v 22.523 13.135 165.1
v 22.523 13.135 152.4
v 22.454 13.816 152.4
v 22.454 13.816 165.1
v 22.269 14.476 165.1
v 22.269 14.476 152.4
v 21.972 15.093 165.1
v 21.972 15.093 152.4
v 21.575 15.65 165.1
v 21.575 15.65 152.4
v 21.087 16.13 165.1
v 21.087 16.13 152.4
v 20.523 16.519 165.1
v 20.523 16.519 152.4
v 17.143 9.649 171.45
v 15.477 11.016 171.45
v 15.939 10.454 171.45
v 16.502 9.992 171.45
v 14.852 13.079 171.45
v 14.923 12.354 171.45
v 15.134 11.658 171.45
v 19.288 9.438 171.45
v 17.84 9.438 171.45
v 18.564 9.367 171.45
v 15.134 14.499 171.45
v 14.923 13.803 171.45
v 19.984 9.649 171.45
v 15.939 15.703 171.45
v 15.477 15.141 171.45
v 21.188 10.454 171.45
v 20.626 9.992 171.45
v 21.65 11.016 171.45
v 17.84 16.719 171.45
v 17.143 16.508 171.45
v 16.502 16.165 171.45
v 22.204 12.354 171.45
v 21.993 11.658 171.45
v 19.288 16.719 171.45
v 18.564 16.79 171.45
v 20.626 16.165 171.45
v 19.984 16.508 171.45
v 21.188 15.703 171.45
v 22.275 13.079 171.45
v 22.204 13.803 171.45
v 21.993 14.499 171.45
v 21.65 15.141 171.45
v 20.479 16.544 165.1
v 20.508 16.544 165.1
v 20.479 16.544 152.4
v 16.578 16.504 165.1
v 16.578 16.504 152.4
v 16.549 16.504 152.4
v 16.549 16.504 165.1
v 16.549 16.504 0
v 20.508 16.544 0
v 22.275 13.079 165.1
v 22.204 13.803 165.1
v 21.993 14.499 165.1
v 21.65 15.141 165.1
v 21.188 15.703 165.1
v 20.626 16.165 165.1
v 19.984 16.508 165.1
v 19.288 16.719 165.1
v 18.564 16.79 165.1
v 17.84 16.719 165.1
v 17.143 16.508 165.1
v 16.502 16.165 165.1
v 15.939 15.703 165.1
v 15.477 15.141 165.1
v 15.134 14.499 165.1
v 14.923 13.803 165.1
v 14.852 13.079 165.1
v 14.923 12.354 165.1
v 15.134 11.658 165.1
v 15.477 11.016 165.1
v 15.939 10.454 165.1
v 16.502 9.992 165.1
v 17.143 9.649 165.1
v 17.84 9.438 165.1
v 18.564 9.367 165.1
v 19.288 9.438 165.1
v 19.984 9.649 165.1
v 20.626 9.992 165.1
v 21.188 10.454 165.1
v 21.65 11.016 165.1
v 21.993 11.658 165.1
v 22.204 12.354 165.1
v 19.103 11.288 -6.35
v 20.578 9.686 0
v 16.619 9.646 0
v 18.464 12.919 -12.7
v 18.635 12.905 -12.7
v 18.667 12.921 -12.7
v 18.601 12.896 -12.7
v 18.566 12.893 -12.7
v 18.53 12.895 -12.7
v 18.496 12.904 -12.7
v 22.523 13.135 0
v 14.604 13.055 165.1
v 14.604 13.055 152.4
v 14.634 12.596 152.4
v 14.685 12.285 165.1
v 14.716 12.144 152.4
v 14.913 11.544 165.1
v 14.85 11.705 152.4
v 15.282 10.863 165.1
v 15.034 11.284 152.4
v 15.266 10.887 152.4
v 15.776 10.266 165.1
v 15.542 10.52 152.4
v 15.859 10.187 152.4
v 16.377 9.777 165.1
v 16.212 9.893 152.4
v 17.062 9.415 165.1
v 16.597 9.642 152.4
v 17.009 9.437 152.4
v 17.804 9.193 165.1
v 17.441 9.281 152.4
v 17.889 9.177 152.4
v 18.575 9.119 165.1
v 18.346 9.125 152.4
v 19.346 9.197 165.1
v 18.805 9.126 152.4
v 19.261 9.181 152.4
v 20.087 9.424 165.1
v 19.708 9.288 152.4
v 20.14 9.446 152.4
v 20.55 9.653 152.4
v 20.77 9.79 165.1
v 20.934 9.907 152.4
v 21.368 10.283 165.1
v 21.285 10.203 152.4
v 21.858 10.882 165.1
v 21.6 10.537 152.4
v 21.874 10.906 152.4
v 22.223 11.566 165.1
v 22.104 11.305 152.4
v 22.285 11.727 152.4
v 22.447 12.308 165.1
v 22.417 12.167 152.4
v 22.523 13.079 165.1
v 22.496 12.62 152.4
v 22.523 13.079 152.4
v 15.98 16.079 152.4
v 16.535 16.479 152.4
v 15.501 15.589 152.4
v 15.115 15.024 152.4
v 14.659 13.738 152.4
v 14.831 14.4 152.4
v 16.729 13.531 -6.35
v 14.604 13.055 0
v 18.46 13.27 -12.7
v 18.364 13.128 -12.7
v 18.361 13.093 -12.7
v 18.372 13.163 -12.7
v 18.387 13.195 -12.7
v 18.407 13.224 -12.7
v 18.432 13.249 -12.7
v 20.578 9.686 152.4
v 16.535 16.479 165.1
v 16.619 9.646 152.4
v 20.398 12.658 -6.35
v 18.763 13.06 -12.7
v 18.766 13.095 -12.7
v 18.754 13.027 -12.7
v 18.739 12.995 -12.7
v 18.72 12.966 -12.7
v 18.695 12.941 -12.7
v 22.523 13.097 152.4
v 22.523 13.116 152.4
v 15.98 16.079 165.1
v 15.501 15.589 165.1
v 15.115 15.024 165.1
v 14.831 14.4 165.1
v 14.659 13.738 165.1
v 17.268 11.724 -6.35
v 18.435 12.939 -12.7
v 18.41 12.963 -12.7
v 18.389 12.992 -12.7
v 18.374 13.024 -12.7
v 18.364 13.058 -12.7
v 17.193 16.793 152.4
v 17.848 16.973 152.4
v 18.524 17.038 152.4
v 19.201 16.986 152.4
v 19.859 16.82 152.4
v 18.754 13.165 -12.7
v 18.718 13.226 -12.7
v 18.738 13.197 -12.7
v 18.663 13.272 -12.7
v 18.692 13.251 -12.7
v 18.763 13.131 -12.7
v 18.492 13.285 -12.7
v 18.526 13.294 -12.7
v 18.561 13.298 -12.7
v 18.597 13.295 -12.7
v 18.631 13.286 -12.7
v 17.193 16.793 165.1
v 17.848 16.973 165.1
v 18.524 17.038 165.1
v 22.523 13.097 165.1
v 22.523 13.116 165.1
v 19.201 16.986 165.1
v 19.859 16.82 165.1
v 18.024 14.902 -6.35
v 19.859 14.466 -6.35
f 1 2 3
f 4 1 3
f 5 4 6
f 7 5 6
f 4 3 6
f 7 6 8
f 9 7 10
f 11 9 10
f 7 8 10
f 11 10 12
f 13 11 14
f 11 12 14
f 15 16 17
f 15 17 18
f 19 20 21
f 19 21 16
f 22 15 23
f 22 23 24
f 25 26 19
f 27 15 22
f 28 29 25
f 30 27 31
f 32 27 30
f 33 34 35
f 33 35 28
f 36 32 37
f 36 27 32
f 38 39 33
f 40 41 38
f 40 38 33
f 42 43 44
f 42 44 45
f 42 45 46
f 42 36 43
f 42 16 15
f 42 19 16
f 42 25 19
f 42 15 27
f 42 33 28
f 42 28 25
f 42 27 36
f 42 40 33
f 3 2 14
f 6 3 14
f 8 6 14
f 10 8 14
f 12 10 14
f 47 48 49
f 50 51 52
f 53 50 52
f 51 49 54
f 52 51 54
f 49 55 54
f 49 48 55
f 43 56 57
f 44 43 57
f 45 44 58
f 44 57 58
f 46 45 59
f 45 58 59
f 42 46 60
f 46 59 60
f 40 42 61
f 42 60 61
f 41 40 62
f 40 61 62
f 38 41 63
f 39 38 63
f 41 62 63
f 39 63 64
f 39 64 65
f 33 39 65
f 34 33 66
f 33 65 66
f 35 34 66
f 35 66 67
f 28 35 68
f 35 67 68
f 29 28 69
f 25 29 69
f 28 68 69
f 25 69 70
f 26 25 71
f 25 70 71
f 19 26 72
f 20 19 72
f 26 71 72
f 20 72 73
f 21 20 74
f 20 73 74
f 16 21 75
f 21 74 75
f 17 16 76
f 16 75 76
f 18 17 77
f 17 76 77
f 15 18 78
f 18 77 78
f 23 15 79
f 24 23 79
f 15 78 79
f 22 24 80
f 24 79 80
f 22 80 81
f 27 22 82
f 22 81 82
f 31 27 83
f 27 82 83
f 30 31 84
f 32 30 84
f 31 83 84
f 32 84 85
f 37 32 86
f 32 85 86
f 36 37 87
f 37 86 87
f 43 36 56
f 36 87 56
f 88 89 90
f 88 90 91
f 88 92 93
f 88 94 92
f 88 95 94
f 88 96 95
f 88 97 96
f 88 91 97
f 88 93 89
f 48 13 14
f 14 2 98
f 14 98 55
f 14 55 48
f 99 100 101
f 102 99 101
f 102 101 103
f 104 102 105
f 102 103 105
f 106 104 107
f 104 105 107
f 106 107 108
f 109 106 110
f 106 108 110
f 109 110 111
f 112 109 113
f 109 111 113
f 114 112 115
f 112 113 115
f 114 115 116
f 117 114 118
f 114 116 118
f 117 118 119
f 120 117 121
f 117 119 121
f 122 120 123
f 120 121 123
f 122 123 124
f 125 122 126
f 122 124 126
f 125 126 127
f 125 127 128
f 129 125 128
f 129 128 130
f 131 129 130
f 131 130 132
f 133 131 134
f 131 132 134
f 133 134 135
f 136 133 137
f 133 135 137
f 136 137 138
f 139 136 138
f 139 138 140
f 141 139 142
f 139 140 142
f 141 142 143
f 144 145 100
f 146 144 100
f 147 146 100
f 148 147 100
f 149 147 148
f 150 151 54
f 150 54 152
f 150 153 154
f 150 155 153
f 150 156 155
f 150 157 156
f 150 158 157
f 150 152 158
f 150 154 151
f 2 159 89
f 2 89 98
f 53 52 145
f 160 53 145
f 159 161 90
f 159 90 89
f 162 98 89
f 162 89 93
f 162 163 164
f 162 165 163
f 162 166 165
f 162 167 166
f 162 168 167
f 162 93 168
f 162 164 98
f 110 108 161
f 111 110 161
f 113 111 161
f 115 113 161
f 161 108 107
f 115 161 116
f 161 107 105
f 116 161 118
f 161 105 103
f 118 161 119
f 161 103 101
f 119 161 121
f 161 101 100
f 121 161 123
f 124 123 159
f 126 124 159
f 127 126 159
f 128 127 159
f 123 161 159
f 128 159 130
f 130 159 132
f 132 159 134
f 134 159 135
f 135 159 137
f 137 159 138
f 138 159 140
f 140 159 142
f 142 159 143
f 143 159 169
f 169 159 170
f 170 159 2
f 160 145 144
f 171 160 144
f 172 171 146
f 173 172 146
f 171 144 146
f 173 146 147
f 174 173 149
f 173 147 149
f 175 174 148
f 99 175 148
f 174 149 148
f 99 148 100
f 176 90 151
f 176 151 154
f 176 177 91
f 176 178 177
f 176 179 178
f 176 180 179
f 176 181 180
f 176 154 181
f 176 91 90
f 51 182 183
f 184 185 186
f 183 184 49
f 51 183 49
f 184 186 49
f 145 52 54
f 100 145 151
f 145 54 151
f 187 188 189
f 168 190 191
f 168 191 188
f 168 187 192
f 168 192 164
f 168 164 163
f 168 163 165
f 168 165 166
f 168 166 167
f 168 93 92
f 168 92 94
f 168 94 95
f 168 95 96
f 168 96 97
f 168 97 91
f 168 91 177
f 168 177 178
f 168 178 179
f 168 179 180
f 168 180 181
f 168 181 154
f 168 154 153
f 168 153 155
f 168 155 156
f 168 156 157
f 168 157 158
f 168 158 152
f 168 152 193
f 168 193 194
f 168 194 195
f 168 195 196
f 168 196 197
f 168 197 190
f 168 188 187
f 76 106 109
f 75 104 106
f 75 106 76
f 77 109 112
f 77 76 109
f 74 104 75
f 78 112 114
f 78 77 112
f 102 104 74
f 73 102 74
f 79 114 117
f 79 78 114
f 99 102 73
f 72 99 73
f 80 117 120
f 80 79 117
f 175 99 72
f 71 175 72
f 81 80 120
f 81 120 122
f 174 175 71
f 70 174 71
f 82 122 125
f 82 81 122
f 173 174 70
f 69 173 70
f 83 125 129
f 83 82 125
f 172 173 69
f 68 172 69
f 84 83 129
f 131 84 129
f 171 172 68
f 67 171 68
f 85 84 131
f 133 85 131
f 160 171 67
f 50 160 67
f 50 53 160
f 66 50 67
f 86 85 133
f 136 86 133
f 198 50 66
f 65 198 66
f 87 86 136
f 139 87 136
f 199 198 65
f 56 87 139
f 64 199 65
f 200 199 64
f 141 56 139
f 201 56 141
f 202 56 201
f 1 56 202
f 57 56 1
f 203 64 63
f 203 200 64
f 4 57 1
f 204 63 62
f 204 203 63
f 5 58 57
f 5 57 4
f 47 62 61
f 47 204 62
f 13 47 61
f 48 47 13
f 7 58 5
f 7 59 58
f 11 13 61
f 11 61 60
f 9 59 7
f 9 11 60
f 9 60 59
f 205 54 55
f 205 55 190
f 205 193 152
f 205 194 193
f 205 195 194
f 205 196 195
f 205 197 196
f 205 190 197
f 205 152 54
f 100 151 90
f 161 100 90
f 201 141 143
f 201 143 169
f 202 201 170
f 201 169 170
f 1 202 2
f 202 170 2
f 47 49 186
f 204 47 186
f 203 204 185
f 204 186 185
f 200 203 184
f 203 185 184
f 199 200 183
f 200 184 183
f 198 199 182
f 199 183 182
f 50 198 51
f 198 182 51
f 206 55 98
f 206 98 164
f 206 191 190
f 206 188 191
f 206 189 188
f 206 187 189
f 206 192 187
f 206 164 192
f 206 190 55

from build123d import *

# Parameters (mm, degrees)
F1_DEPTH = 152.4
F3_DEPTH = 12.7
F4_R     = 3.7116770234
F5_DEPTH = 6.35
F7_R     = 0.2026181046


with BuildPart() as f1:
    # F0 (on Top) → F1 (new body)
    with BuildSketch(Plane.XY):
        Polygon((22.5227356887, 13.1351892635), (20.5084380472, 16.5440003483), (16.5491722304, 16.5039729623), (14.604204055, 13.0551344916), (16.6185016965, 9.6463234069), (20.5777675134, 9.6863507928), align=None)
    extrude(amount=F1_DEPTH)

    # F1_face (on face) + F1_face1 (on face) + F2 (on face) → F3 (join)
    with BuildSketch(Plane(origin=(18.5634698719, 13.0951618776, 152.4), x_dir=(1, 0, 0), z_dir=(0, 0, 1))):
        Polygon((3.9592658168, 0.0400273859), (1.9449681753, 3.4488384707), (-2.0142976415, 3.4088110847), (-3.9592658168, -0.0400273859), (-1.9449681753, -3.4488384707), (2.0142976415, -3.4088110847), align=None)
    with BuildSketch(Plane(origin=(18.5634698719, 13.0951618776, 0), x_dir=(1, 0, 0), z_dir=(0, 0, -1))):
        Polygon((1.9449681753, -3.4488384707), (3.9592658168, -0.0400273859), (2.0142976415, 3.4088110847), (-1.9449681753, 3.4488384707), (-3.9592658168, 0.0400273859), (-2.0142976415, -3.4088110847), align=None)
    with BuildSketch(Plane.XY.offset(152.4)):
        with BuildLine():
            ThreePointArc((14.604204055, 13.0551344916), (18.5753456023, 9.1190642761), (22.5231408121, 13.0785499639))
            ThreePointArc((22.5231408121, 13.0785499639), (22.5230395299, 13.1068703381), (22.5227356887, 13.1351892635))
            Line((22.5227356887, 13.1351892635), (20.5777675134, 9.6863507928))
            Line((20.5777675134, 9.6863507928), (16.6185016965, 9.6463234069))
            Line((16.6185016965, 9.6463234069), (14.604204055, 13.0551344916))
        make_face()
        with BuildLine():
            Line((20.5230763012, 16.5192279208), (22.5227356887, 13.1351892635))
            ThreePointArc((22.5227356887, 13.1351892635), (21.9724789039, 15.0928653351), (20.5230763012, 16.5192279208))
        make_face()
        with BuildLine():
            Line((20.5777675134, 9.6863507928), (22.5227356887, 13.1351892635))
            Line((22.5227356887, 13.1351892635), (20.5230763012, 16.5192279208))
            ThreePointArc((20.5230763012, 16.5192279208), (20.501303397, 16.5315365084), (20.4794531772, 16.543707317))
            Line((20.4794531772, 16.543707317), (16.5781571004, 16.5042659936))
            ThreePointArc((16.5781571004, 16.5042659936), (16.5565574105, 16.491655915), (16.5350378058, 16.4789096488))
            Line((16.5350378058, 16.4789096488), (14.604204055, 13.0551344916))
            Line((14.604204055, 13.0551344916), (16.6185016965, 9.6463234069))
            Line((16.6185016965, 9.6463234069), (20.5777675134, 9.6863507928))
        make_face()
        with BuildLine():
            ThreePointArc((16.5350378058, 16.4789096488), (15.1147689879, 15.0235352587), (14.604204055, 13.0551344916))
            Line((14.604204055, 13.0551344916), (16.5350378058, 16.4789096488))
        make_face()
        with BuildLine():
            Line((16.5781571004, 16.5042659936), (20.4794531772, 16.543707317))
            ThreePointArc((20.4794531772, 16.543707317), (18.5236100767, 17.0378506299), (16.5781571004, 16.5042659936))
        make_face()
    extrude(amount=F3_DEPTH, dir=(0, 0, 1))

    # F4 (on face) → F5 (join)
    with BuildSketch(Plane.XY.offset(165.1)):
        with Locations((18.563637815, 13.0785499639)):
            Circle(F4_R)
    extrude(amount=F5_DEPTH)

    # F1_face1 (on face) → F8 section 0
    with BuildSketch(Plane(origin=(18.5634698719, 13.0951618776, 0), x_dir=(1, 0, 0), z_dir=(0, 0, -1))):
        Polygon((1.9449681753, -3.4488384707), (3.9592658168, -0.0400273859), (2.0142976415, 3.4088110847), (-1.9449681753, 3.4488384707), (-3.9592658168, 0.0400273859), (-2.0142976415, -3.4088110847), align=None)
    # F7 (on offset) → F8 section 1
    with BuildSketch(Plane(origin=(0, 0, -12.7), x_dir=(1, 0, 0), z_dir=(0, 0, -1))):
        with Locations((18.5634698719, -13.0951618776)):
            Circle(F7_R)
    loft()


solid = f1.part
